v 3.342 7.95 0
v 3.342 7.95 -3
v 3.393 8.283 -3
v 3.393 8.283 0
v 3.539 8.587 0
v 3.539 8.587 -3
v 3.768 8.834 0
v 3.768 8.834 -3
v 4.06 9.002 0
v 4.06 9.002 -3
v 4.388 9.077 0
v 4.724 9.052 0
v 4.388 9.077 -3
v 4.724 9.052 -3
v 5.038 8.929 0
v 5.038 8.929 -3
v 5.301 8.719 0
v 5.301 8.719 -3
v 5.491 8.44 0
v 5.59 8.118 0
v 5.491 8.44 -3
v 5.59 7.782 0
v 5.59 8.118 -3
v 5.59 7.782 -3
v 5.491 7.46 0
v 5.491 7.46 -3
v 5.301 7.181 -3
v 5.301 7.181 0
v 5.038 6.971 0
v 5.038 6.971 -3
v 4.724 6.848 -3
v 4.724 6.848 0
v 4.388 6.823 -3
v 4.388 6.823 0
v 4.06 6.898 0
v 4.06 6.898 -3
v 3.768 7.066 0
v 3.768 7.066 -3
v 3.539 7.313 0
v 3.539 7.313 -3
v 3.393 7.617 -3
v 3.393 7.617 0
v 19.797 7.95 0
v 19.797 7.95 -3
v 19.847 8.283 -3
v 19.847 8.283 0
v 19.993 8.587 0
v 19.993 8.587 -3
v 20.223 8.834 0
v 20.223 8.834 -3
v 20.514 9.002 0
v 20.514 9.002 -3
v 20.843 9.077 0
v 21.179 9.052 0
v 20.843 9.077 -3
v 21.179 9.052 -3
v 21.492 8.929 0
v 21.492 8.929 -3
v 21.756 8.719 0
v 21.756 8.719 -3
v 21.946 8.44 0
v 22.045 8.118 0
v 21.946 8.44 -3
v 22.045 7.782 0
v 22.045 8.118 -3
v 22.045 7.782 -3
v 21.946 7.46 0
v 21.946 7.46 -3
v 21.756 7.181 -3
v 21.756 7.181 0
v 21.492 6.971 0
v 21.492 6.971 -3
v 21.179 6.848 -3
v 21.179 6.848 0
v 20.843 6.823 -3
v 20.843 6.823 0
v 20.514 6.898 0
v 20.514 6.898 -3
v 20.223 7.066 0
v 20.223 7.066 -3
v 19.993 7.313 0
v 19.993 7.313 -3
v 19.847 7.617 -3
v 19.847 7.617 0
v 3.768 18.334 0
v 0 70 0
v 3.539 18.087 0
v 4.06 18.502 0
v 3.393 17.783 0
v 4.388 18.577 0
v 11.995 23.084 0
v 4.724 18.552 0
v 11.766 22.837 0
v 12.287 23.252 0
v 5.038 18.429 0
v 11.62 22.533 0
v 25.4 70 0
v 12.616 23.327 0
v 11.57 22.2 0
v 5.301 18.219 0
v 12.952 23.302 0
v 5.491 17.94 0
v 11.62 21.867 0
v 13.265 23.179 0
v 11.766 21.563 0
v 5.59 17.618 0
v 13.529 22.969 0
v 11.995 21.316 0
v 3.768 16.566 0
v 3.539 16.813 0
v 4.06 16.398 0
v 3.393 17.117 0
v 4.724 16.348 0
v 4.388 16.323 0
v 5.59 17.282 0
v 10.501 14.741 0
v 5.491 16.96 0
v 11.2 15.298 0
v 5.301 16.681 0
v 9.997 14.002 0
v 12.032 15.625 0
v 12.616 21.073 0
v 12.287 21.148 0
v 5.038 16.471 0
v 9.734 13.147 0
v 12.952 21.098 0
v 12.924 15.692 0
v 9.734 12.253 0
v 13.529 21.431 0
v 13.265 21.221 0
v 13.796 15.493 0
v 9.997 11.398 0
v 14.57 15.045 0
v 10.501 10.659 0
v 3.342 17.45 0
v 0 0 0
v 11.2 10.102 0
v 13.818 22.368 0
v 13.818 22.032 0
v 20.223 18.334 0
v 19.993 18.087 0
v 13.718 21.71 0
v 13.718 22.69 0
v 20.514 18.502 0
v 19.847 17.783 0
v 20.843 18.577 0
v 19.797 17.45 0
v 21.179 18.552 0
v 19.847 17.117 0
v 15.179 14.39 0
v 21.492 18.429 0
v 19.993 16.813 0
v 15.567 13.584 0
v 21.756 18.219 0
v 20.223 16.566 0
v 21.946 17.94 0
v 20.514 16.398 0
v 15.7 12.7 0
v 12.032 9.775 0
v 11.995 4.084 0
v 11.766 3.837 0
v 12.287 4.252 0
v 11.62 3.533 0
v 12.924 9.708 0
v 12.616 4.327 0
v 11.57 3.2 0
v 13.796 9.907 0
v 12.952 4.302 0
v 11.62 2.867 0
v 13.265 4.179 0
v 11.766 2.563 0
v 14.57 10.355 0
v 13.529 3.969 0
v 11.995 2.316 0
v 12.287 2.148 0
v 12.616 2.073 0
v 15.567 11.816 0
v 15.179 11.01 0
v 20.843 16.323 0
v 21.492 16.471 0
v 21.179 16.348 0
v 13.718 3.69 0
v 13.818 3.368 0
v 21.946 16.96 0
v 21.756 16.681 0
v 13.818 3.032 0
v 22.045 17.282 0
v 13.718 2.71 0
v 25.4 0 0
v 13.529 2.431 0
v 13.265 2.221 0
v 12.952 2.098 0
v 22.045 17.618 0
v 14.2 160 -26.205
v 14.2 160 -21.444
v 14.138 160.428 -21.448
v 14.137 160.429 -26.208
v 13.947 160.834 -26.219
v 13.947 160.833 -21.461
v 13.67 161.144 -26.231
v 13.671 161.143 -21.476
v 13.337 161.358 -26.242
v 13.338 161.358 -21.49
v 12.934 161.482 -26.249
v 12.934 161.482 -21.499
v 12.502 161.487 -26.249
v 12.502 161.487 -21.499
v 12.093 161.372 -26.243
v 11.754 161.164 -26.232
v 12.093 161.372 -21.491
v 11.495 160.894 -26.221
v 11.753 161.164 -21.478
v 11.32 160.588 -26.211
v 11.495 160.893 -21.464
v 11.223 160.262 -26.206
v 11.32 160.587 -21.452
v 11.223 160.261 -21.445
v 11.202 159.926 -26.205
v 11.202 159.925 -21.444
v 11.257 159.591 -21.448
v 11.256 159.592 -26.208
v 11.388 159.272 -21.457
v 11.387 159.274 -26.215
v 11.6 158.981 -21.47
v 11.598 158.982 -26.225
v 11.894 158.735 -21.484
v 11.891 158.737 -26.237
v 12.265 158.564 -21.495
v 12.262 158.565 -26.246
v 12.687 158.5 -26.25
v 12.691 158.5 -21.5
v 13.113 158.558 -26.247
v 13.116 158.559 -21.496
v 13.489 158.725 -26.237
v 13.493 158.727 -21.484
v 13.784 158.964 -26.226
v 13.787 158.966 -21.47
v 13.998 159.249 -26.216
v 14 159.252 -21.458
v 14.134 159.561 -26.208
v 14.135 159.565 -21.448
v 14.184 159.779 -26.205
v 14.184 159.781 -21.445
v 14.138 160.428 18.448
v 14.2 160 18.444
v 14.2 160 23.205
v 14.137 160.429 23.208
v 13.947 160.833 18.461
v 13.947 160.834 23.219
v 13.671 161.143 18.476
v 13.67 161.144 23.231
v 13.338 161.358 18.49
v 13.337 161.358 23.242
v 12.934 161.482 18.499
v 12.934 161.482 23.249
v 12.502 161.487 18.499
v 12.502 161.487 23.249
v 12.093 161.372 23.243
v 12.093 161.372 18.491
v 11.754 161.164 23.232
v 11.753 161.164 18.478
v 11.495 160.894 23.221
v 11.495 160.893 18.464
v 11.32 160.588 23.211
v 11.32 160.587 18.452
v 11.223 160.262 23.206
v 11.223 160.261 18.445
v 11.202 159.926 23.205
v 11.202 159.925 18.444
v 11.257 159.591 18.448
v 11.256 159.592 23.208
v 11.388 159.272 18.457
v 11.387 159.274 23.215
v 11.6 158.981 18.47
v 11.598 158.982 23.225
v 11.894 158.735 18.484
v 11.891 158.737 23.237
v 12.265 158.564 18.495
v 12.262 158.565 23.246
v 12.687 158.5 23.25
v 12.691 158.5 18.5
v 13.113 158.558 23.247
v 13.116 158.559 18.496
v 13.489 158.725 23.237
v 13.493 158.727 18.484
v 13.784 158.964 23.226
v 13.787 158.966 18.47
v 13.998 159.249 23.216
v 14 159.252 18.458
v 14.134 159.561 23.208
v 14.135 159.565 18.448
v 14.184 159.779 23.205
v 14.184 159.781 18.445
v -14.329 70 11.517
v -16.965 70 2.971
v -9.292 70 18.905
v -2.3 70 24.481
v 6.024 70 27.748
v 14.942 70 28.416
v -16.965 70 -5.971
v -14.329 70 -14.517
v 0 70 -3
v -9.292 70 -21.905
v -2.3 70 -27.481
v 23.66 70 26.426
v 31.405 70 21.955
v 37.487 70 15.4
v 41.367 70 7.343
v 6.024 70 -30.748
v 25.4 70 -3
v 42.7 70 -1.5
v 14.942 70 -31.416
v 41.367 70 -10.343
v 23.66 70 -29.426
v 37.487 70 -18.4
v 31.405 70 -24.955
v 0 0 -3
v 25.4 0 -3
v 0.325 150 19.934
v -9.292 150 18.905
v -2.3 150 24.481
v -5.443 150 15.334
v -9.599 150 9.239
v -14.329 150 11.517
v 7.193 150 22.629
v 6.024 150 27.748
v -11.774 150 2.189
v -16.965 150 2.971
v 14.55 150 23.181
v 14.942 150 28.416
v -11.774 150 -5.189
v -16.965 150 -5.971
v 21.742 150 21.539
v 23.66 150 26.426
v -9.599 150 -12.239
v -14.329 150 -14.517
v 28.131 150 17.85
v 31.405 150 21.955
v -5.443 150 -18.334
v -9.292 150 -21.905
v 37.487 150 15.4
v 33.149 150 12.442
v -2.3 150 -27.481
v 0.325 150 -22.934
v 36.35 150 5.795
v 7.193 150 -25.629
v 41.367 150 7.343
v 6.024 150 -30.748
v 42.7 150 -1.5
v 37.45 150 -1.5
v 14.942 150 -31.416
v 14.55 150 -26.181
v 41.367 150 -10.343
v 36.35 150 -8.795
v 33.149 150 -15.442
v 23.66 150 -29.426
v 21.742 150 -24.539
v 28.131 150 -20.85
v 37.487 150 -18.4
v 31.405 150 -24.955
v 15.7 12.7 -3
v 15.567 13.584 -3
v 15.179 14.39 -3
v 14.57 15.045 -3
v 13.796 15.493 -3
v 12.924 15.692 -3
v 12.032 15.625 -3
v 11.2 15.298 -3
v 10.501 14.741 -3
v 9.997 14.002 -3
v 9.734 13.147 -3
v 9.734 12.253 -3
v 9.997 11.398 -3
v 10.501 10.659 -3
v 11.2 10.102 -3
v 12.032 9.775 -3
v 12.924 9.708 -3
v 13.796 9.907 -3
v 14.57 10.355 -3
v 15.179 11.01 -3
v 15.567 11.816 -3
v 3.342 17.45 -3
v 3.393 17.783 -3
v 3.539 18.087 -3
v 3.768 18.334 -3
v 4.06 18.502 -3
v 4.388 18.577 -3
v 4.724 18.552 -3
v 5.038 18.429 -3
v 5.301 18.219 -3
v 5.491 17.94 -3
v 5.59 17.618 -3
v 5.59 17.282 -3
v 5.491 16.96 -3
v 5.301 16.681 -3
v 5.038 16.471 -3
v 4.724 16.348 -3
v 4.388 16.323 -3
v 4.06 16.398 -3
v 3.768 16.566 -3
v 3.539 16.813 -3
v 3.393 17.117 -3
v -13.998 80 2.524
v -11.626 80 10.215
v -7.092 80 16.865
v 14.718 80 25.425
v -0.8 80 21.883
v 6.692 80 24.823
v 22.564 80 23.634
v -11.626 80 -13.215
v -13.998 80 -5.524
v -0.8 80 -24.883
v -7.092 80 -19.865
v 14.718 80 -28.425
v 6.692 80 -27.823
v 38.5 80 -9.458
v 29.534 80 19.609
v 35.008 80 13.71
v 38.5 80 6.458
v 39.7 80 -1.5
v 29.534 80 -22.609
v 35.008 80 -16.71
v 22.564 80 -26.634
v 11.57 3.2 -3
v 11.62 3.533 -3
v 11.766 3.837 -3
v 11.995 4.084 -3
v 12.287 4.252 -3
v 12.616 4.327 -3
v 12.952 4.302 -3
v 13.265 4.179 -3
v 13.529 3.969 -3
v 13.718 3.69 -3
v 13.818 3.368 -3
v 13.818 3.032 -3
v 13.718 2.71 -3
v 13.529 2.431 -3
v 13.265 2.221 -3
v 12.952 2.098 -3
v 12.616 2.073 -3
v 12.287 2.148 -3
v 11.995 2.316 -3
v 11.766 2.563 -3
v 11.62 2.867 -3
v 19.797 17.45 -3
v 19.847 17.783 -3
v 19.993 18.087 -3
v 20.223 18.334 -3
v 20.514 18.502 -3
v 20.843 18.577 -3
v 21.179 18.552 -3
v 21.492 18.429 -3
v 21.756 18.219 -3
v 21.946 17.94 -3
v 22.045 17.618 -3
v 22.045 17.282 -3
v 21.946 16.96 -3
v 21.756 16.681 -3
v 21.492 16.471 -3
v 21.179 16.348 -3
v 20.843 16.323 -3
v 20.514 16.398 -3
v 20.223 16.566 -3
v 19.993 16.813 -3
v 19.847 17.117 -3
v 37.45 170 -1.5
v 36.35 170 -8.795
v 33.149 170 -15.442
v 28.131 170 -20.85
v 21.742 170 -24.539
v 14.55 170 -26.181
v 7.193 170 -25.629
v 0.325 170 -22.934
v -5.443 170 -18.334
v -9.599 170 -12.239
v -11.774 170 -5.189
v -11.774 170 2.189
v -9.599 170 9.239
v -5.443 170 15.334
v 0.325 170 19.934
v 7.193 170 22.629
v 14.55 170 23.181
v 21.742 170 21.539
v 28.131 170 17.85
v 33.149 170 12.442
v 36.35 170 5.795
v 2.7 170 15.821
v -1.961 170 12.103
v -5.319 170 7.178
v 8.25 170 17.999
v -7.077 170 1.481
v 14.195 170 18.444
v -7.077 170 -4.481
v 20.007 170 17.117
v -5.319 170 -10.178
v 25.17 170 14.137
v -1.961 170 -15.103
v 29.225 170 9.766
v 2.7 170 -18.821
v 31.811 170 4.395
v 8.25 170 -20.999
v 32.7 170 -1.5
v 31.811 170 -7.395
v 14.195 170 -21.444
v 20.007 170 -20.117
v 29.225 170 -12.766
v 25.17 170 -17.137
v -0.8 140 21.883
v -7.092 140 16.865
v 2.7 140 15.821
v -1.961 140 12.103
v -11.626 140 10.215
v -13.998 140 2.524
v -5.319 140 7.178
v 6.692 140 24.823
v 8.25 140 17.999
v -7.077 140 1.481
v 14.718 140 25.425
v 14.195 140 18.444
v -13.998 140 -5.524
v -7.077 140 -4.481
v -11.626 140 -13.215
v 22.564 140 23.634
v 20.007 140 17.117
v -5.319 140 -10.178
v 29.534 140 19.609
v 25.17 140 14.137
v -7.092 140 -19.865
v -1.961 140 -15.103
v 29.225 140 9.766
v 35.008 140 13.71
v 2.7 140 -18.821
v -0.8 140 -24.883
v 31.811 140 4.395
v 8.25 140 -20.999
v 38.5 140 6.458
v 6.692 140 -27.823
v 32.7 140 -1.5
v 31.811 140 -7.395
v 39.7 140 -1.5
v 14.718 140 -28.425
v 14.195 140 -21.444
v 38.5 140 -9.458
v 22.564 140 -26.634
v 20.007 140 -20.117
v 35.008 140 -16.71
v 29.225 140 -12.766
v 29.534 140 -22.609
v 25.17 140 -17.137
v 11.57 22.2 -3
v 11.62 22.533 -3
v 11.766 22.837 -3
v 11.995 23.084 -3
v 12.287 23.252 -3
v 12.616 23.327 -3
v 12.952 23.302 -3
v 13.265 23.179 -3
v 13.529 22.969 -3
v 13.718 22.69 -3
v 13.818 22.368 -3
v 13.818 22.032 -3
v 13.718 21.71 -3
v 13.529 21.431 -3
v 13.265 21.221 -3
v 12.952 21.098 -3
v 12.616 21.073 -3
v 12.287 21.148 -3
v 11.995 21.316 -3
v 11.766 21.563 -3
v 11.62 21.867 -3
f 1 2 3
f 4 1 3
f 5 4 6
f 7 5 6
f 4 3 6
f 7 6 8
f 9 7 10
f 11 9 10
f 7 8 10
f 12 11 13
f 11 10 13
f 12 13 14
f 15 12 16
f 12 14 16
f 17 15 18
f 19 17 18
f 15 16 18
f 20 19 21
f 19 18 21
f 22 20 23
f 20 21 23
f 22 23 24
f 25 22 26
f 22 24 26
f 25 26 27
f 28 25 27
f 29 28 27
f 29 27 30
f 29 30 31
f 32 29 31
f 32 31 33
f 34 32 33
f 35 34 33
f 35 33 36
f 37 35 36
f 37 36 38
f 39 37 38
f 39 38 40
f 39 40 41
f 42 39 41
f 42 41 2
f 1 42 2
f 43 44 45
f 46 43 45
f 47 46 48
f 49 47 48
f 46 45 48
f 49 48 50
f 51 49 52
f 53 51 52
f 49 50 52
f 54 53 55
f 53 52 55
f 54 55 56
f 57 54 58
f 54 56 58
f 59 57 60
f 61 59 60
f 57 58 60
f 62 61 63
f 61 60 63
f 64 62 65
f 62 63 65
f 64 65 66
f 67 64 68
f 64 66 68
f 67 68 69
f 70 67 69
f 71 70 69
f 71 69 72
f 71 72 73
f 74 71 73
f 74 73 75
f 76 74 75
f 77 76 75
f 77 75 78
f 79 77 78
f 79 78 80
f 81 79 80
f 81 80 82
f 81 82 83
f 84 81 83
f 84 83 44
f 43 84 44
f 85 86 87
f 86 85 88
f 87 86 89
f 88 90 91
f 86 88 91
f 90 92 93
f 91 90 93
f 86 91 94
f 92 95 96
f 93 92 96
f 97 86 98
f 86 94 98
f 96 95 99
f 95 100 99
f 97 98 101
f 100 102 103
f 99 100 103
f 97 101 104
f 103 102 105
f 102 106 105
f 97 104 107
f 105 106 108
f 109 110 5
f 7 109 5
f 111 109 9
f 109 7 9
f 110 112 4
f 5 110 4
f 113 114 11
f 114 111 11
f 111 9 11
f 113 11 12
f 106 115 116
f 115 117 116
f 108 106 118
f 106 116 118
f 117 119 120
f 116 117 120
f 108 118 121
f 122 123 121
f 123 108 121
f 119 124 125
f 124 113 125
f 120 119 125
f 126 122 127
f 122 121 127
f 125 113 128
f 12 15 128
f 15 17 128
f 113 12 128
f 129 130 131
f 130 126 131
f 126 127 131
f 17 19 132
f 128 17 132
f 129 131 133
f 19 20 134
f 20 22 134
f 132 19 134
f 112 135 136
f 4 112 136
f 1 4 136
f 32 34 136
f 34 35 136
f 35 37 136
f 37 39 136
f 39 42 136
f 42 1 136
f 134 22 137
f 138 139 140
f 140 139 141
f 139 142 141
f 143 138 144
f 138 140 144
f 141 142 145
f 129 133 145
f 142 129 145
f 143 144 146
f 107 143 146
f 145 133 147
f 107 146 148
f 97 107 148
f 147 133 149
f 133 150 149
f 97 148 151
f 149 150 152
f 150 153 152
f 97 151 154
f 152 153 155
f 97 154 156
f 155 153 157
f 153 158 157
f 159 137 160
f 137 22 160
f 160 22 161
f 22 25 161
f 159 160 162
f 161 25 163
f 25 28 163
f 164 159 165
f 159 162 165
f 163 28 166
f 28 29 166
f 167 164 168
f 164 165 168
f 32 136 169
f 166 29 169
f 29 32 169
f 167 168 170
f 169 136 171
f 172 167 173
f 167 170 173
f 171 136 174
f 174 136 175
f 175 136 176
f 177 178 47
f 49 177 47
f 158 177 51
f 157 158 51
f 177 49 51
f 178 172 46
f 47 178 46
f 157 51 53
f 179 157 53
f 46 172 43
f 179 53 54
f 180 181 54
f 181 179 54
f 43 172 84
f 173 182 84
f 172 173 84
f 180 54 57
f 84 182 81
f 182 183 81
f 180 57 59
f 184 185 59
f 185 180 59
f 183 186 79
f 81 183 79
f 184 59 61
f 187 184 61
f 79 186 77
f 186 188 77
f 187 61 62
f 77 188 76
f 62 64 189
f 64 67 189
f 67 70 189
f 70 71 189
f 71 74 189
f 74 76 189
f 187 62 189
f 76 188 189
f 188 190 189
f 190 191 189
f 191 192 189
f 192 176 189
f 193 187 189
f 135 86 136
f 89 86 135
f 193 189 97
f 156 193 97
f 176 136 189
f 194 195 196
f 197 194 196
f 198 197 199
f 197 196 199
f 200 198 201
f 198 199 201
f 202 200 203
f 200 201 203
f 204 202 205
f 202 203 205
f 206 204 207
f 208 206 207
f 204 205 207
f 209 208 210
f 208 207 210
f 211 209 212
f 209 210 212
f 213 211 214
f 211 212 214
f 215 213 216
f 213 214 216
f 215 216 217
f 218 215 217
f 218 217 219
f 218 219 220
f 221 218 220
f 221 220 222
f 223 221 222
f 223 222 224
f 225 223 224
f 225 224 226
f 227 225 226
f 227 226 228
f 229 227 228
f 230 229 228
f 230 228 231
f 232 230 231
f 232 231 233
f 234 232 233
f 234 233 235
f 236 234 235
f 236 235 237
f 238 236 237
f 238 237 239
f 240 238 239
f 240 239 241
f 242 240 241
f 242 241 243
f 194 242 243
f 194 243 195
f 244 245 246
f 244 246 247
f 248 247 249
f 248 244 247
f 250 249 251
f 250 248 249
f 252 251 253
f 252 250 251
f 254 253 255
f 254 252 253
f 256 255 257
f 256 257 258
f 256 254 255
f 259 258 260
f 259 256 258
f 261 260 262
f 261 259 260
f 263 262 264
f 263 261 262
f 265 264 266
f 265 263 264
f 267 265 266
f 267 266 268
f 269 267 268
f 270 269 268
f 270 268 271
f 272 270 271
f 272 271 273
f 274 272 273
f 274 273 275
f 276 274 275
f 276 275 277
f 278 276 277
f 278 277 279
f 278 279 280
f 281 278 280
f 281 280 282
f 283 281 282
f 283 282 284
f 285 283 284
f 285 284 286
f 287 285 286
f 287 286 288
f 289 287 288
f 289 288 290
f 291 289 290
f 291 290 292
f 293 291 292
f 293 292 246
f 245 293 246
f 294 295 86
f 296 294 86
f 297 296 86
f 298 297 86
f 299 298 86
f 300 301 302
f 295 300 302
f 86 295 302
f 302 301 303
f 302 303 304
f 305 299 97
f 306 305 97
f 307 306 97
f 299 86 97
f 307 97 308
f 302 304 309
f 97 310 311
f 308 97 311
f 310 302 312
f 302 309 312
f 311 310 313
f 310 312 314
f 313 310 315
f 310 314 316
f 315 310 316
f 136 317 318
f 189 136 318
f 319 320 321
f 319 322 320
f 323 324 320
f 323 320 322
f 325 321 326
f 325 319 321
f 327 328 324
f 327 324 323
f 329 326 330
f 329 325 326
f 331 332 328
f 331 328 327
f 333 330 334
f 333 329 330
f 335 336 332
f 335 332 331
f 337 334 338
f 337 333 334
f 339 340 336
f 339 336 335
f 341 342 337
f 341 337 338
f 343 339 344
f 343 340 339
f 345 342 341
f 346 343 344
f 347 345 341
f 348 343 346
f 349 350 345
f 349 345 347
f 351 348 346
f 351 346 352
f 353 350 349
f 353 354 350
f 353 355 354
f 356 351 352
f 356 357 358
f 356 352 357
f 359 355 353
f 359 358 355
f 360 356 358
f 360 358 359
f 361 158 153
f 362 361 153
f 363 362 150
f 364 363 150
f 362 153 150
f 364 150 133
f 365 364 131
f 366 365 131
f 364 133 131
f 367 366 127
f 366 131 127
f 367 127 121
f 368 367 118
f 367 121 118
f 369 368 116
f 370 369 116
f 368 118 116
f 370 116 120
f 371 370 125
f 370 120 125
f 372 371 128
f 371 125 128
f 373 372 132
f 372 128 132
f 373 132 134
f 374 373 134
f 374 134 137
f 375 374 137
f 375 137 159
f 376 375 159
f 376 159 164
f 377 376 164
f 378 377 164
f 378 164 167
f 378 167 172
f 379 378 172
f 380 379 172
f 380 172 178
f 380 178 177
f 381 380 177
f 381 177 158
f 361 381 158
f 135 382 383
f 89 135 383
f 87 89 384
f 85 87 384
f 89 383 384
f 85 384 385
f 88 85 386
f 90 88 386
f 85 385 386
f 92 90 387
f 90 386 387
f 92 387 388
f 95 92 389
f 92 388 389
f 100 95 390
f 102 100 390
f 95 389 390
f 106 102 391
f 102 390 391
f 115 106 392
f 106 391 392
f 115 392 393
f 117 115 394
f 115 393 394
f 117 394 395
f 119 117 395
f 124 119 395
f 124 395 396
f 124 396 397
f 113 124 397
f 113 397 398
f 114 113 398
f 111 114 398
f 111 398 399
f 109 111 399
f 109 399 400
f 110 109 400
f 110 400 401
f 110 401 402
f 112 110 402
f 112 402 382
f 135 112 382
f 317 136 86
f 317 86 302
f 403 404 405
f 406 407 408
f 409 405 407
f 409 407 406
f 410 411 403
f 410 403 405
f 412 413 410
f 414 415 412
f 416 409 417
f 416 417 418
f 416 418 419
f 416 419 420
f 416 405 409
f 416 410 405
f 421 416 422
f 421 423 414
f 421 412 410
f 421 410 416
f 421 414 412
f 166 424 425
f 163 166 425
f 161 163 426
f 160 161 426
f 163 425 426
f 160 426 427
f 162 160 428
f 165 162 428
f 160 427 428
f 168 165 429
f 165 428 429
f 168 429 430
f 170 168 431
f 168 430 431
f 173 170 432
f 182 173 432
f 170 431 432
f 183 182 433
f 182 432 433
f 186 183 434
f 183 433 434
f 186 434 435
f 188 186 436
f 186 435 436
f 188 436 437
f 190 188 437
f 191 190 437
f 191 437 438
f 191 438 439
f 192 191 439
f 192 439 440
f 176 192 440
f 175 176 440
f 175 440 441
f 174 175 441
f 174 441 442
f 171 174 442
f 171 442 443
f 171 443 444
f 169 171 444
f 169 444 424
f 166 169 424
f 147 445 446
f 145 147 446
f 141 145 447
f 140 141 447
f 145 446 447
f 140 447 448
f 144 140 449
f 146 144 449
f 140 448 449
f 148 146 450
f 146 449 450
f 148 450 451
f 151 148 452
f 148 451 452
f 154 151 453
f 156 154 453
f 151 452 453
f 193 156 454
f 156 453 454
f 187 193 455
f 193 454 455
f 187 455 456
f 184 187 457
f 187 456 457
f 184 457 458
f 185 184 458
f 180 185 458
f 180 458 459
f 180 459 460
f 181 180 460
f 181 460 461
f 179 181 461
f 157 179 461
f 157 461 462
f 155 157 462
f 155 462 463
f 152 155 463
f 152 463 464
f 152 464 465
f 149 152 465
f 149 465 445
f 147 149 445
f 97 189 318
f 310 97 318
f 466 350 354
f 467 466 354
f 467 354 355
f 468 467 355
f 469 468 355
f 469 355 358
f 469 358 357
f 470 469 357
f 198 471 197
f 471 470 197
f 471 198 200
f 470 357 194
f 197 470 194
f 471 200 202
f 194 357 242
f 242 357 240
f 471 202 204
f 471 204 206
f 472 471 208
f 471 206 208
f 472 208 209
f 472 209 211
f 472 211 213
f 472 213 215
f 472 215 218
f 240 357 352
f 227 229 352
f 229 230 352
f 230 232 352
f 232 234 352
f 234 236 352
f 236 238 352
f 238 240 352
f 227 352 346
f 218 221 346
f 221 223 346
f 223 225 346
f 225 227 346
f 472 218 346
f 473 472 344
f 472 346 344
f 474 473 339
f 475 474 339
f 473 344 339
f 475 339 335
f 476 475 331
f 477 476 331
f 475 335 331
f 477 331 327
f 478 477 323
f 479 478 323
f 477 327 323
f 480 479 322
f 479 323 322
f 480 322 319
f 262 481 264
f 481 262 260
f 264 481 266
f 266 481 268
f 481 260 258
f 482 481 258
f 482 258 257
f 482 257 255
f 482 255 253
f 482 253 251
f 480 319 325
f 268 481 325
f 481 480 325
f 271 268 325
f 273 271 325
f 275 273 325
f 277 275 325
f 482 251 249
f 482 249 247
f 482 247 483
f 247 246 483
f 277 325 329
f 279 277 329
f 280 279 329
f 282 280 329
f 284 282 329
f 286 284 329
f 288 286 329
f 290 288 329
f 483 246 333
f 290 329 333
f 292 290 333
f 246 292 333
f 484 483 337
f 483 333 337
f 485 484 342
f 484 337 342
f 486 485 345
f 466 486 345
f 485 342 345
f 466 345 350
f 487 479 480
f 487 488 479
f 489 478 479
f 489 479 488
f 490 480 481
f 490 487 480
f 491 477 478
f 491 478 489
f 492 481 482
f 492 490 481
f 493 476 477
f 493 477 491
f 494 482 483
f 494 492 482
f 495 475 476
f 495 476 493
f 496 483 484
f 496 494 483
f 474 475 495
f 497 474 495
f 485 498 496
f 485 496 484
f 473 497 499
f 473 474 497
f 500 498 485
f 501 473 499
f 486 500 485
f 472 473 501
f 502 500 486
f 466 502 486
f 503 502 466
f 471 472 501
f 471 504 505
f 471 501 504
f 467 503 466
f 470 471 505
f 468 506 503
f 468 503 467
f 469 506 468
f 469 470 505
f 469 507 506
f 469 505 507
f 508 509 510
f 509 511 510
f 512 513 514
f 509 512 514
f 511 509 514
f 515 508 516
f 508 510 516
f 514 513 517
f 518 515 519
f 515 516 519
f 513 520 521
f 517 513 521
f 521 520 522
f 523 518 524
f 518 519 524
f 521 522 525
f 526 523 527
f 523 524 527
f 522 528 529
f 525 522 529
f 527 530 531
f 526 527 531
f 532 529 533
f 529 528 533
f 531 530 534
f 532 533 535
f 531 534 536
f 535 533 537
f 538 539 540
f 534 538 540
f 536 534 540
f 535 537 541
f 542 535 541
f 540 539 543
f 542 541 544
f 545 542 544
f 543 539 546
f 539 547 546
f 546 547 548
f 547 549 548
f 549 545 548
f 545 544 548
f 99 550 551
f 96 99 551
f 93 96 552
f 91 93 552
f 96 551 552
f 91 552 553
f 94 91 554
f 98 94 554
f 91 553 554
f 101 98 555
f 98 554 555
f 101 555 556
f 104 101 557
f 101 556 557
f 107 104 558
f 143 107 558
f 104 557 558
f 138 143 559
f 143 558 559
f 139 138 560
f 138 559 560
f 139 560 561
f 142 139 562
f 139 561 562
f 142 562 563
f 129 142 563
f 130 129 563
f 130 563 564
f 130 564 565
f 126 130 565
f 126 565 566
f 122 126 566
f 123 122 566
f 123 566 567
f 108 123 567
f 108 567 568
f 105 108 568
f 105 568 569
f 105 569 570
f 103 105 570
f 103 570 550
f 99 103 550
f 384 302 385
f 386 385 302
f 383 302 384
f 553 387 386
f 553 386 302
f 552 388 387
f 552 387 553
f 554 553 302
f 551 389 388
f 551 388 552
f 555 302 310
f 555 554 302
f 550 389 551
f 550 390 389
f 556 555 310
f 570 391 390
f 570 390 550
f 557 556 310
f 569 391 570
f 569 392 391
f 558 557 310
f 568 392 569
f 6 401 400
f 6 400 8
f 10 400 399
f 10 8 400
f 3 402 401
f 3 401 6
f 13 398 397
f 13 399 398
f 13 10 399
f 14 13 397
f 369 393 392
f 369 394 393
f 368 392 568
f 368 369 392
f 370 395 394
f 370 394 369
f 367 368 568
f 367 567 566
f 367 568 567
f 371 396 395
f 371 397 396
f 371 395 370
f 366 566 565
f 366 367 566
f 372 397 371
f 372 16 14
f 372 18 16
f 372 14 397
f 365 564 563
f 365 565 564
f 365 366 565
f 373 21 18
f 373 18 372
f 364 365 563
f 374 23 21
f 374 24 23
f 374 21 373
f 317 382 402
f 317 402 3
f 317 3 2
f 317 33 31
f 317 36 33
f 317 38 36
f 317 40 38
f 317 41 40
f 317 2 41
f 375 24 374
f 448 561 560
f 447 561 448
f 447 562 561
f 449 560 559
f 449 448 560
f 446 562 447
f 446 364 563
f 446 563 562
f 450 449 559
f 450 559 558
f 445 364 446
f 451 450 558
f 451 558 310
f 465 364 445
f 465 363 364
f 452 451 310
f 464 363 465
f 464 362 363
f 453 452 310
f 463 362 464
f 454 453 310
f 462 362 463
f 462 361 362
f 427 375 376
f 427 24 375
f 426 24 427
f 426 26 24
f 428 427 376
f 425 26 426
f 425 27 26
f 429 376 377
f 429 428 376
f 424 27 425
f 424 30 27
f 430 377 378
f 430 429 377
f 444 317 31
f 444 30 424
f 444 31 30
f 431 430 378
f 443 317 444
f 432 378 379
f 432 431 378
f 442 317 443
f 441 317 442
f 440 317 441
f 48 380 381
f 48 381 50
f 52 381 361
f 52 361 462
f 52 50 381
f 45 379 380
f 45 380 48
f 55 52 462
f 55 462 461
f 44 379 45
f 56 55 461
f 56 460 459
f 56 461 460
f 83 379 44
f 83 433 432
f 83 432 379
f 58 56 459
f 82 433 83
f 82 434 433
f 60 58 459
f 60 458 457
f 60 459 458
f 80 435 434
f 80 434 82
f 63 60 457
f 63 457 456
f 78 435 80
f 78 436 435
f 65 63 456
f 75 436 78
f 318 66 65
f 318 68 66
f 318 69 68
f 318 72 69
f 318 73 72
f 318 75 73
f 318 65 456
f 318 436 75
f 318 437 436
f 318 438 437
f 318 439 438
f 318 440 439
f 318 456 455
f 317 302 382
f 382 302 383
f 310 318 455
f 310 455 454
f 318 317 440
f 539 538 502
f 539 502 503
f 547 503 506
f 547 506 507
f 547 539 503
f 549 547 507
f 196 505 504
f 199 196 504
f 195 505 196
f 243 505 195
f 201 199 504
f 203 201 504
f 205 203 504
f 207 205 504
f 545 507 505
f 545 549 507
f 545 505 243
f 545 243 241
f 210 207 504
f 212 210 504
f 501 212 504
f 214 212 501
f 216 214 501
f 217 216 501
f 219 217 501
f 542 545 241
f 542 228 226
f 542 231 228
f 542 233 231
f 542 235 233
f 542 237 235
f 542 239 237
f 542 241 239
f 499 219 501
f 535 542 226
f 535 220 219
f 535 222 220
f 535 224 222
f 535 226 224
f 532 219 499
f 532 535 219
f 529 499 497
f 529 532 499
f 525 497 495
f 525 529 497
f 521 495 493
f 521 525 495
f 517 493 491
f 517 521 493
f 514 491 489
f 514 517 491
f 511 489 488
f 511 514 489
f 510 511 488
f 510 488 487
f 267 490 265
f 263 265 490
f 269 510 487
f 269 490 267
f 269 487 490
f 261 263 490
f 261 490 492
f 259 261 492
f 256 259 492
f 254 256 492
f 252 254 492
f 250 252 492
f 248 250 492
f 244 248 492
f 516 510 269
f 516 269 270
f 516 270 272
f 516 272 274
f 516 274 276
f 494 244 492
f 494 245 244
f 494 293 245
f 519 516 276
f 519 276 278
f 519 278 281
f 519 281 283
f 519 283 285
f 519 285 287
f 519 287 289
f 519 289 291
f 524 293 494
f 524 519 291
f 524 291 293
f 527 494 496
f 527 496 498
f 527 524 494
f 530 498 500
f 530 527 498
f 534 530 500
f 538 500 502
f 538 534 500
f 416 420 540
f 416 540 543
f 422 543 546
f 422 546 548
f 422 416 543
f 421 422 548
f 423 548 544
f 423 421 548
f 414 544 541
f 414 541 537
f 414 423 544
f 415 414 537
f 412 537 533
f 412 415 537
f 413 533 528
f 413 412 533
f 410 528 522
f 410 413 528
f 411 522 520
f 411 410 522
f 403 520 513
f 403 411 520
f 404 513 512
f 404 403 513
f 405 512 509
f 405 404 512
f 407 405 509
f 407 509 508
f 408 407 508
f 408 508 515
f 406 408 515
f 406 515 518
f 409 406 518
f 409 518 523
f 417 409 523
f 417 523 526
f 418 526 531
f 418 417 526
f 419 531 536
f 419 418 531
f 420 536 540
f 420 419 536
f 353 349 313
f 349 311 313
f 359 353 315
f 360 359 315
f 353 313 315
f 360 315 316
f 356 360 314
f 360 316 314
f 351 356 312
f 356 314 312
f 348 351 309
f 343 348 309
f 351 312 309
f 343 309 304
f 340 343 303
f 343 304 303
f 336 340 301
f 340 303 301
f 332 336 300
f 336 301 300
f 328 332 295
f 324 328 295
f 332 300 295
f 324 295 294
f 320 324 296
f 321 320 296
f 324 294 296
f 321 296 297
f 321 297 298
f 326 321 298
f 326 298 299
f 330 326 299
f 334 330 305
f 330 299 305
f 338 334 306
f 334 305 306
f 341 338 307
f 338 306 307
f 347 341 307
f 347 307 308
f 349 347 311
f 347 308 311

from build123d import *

# Parameters (mm, degrees)
SKETCH2_W                 = 25.4
SKETCH2_H                 = 3
BOSS_EXTRUDE1_DEPTH       = 70
SKETCH4_R                 = 30
BOSS_EXTRUDE2_DEPTH       = 10
SKETCH5_R                 = 30
SKETCH5_R_2               = 20
BOSS_EXTRUDE3_DEPTH       = 70
SKETCH8_R                 = 24.75
SKETCH8_R_2               = 20
BOSS_EXTRUDE4_DEPTH       = 20
SKETCH9_R                 = 1.5
CUT_EXTRUDE4_DEPTH        = 29.5
CUT_EXTRUDE4_DEPTH_BACK   = 32.5
F_4_40_TAPPED_HOLE1_D     = 2.2606
F_4_40_TAPPED_HOLE1_DEPTH = 7.6
F_4_40_TAPPED_HOLE1_TIP   = 0.679152758
SKETCH3_R                 = 3
CUT_EXTRUDE5_DEPTH        = 10
SKETCH12_R                = 27
SKETCH12_R_2              = 20
CUT_EXTRUDE6_DEPTH        = 60


with BuildPart() as part:
    # Sketch2 → Boss-Extrude1 (new body)
    with BuildSketch(Plane(origin=(0, 0, 0), x_dir=(1, 0, 0), z_dir=(0, 1, 0))):
        with Locations((12.7, 1.5)):
            Rectangle(SKETCH2_W, SKETCH2_H)
    extrude(amount=BOSS_EXTRUDE1_DEPTH)

    # Sketch4 → Boss-Extrude2 (add)
    with BuildSketch(Plane(origin=(0, 70, 0), x_dir=(1, 0, 0), z_dir=(0, 1, 0))):
        with Locations((12.7, 1.5)):
            Circle(SKETCH4_R)
    extrude(amount=BOSS_EXTRUDE2_DEPTH)

    # Sketch5 → Boss-Extrude3 (add)
    with BuildSketch(Plane(origin=(0, 80, 0), x_dir=(1, 0, 0), z_dir=(0, 1, 0))):
        with Locations((12.7, 1.5)):
            Circle(SKETCH5_R)
        with Locations((12.7, 1.5)):
            Circle(SKETCH5_R_2, mode=Mode.SUBTRACT)
    extrude(amount=BOSS_EXTRUDE3_DEPTH)

    # Sketch8 → Boss-Extrude4 (add)
    with BuildSketch(Plane(origin=(0, 150, 0), x_dir=(1, 0, 0), z_dir=(0, 1, 0))):
        with Locations((12.7, 1.5)):
            Circle(SKETCH8_R)
        with Locations((12.7, 1.5)):
            Circle(SKETCH8_R_2, mode=Mode.SUBTRACT)
    extrude(amount=BOSS_EXTRUDE4_DEPTH)

    # Sketch9 → Cut-Extrude4 (cut, two sides)
    with BuildSketch(Plane.XY) as cut_extrude4_sk:
        with Locations((12.7, 160)):
            Circle(SKETCH9_R)
    extrude(amount=CUT_EXTRUDE4_DEPTH, mode=Mode.SUBTRACT)
    extrude(cut_extrude4_sk.sketch, amount=-CUT_EXTRUDE4_DEPTH_BACK, mode=Mode.SUBTRACT)

    # #4-40 Tapped Hole1
    with Locations(Plane.XY):
        with Locations((12.7, 22.2), (20.927241336, 17.45), (20.927241336, 7.95), (12.7, 3.2), (4.472758664, 7.95), (4.472758664, 17.45)):
            Hole(F_4_40_TAPPED_HOLE1_D / 2, depth=F_4_40_TAPPED_HOLE1_DEPTH)
            with Locations((0, 0, -(F_4_40_TAPPED_HOLE1_DEPTH + F_4_40_TAPPED_HOLE1_TIP / 2))):  # 118° drill point
                Cone(0, F_4_40_TAPPED_HOLE1_D / 2, F_4_40_TAPPED_HOLE1_TIP, mode=Mode.SUBTRACT)

    # Sketch3 → Cut-Extrude5 (cut)
    with BuildSketch(Plane.XY):
        with Locations((12.7, 12.7)):
            Circle(SKETCH3_R)
    extrude(amount=-CUT_EXTRUDE5_DEPTH, mode=Mode.SUBTRACT)

    # Sketch12 → Cut-Extrude6 (cut)
    with BuildSketch(Plane(origin=(0, 80, 0), x_dir=(1, 0, 0), z_dir=(0, 1, 0))):
        with Locations((12.7, 1.5)):
            Circle(SKETCH12_R)
        with Locations((12.7, 1.5)):
            Circle(SKETCH12_R_2, mode=Mode.SUBTRACT)
    extrude(amount=CUT_EXTRUDE6_DEPTH, mode=Mode.SUBTRACT)


solid = part.part
